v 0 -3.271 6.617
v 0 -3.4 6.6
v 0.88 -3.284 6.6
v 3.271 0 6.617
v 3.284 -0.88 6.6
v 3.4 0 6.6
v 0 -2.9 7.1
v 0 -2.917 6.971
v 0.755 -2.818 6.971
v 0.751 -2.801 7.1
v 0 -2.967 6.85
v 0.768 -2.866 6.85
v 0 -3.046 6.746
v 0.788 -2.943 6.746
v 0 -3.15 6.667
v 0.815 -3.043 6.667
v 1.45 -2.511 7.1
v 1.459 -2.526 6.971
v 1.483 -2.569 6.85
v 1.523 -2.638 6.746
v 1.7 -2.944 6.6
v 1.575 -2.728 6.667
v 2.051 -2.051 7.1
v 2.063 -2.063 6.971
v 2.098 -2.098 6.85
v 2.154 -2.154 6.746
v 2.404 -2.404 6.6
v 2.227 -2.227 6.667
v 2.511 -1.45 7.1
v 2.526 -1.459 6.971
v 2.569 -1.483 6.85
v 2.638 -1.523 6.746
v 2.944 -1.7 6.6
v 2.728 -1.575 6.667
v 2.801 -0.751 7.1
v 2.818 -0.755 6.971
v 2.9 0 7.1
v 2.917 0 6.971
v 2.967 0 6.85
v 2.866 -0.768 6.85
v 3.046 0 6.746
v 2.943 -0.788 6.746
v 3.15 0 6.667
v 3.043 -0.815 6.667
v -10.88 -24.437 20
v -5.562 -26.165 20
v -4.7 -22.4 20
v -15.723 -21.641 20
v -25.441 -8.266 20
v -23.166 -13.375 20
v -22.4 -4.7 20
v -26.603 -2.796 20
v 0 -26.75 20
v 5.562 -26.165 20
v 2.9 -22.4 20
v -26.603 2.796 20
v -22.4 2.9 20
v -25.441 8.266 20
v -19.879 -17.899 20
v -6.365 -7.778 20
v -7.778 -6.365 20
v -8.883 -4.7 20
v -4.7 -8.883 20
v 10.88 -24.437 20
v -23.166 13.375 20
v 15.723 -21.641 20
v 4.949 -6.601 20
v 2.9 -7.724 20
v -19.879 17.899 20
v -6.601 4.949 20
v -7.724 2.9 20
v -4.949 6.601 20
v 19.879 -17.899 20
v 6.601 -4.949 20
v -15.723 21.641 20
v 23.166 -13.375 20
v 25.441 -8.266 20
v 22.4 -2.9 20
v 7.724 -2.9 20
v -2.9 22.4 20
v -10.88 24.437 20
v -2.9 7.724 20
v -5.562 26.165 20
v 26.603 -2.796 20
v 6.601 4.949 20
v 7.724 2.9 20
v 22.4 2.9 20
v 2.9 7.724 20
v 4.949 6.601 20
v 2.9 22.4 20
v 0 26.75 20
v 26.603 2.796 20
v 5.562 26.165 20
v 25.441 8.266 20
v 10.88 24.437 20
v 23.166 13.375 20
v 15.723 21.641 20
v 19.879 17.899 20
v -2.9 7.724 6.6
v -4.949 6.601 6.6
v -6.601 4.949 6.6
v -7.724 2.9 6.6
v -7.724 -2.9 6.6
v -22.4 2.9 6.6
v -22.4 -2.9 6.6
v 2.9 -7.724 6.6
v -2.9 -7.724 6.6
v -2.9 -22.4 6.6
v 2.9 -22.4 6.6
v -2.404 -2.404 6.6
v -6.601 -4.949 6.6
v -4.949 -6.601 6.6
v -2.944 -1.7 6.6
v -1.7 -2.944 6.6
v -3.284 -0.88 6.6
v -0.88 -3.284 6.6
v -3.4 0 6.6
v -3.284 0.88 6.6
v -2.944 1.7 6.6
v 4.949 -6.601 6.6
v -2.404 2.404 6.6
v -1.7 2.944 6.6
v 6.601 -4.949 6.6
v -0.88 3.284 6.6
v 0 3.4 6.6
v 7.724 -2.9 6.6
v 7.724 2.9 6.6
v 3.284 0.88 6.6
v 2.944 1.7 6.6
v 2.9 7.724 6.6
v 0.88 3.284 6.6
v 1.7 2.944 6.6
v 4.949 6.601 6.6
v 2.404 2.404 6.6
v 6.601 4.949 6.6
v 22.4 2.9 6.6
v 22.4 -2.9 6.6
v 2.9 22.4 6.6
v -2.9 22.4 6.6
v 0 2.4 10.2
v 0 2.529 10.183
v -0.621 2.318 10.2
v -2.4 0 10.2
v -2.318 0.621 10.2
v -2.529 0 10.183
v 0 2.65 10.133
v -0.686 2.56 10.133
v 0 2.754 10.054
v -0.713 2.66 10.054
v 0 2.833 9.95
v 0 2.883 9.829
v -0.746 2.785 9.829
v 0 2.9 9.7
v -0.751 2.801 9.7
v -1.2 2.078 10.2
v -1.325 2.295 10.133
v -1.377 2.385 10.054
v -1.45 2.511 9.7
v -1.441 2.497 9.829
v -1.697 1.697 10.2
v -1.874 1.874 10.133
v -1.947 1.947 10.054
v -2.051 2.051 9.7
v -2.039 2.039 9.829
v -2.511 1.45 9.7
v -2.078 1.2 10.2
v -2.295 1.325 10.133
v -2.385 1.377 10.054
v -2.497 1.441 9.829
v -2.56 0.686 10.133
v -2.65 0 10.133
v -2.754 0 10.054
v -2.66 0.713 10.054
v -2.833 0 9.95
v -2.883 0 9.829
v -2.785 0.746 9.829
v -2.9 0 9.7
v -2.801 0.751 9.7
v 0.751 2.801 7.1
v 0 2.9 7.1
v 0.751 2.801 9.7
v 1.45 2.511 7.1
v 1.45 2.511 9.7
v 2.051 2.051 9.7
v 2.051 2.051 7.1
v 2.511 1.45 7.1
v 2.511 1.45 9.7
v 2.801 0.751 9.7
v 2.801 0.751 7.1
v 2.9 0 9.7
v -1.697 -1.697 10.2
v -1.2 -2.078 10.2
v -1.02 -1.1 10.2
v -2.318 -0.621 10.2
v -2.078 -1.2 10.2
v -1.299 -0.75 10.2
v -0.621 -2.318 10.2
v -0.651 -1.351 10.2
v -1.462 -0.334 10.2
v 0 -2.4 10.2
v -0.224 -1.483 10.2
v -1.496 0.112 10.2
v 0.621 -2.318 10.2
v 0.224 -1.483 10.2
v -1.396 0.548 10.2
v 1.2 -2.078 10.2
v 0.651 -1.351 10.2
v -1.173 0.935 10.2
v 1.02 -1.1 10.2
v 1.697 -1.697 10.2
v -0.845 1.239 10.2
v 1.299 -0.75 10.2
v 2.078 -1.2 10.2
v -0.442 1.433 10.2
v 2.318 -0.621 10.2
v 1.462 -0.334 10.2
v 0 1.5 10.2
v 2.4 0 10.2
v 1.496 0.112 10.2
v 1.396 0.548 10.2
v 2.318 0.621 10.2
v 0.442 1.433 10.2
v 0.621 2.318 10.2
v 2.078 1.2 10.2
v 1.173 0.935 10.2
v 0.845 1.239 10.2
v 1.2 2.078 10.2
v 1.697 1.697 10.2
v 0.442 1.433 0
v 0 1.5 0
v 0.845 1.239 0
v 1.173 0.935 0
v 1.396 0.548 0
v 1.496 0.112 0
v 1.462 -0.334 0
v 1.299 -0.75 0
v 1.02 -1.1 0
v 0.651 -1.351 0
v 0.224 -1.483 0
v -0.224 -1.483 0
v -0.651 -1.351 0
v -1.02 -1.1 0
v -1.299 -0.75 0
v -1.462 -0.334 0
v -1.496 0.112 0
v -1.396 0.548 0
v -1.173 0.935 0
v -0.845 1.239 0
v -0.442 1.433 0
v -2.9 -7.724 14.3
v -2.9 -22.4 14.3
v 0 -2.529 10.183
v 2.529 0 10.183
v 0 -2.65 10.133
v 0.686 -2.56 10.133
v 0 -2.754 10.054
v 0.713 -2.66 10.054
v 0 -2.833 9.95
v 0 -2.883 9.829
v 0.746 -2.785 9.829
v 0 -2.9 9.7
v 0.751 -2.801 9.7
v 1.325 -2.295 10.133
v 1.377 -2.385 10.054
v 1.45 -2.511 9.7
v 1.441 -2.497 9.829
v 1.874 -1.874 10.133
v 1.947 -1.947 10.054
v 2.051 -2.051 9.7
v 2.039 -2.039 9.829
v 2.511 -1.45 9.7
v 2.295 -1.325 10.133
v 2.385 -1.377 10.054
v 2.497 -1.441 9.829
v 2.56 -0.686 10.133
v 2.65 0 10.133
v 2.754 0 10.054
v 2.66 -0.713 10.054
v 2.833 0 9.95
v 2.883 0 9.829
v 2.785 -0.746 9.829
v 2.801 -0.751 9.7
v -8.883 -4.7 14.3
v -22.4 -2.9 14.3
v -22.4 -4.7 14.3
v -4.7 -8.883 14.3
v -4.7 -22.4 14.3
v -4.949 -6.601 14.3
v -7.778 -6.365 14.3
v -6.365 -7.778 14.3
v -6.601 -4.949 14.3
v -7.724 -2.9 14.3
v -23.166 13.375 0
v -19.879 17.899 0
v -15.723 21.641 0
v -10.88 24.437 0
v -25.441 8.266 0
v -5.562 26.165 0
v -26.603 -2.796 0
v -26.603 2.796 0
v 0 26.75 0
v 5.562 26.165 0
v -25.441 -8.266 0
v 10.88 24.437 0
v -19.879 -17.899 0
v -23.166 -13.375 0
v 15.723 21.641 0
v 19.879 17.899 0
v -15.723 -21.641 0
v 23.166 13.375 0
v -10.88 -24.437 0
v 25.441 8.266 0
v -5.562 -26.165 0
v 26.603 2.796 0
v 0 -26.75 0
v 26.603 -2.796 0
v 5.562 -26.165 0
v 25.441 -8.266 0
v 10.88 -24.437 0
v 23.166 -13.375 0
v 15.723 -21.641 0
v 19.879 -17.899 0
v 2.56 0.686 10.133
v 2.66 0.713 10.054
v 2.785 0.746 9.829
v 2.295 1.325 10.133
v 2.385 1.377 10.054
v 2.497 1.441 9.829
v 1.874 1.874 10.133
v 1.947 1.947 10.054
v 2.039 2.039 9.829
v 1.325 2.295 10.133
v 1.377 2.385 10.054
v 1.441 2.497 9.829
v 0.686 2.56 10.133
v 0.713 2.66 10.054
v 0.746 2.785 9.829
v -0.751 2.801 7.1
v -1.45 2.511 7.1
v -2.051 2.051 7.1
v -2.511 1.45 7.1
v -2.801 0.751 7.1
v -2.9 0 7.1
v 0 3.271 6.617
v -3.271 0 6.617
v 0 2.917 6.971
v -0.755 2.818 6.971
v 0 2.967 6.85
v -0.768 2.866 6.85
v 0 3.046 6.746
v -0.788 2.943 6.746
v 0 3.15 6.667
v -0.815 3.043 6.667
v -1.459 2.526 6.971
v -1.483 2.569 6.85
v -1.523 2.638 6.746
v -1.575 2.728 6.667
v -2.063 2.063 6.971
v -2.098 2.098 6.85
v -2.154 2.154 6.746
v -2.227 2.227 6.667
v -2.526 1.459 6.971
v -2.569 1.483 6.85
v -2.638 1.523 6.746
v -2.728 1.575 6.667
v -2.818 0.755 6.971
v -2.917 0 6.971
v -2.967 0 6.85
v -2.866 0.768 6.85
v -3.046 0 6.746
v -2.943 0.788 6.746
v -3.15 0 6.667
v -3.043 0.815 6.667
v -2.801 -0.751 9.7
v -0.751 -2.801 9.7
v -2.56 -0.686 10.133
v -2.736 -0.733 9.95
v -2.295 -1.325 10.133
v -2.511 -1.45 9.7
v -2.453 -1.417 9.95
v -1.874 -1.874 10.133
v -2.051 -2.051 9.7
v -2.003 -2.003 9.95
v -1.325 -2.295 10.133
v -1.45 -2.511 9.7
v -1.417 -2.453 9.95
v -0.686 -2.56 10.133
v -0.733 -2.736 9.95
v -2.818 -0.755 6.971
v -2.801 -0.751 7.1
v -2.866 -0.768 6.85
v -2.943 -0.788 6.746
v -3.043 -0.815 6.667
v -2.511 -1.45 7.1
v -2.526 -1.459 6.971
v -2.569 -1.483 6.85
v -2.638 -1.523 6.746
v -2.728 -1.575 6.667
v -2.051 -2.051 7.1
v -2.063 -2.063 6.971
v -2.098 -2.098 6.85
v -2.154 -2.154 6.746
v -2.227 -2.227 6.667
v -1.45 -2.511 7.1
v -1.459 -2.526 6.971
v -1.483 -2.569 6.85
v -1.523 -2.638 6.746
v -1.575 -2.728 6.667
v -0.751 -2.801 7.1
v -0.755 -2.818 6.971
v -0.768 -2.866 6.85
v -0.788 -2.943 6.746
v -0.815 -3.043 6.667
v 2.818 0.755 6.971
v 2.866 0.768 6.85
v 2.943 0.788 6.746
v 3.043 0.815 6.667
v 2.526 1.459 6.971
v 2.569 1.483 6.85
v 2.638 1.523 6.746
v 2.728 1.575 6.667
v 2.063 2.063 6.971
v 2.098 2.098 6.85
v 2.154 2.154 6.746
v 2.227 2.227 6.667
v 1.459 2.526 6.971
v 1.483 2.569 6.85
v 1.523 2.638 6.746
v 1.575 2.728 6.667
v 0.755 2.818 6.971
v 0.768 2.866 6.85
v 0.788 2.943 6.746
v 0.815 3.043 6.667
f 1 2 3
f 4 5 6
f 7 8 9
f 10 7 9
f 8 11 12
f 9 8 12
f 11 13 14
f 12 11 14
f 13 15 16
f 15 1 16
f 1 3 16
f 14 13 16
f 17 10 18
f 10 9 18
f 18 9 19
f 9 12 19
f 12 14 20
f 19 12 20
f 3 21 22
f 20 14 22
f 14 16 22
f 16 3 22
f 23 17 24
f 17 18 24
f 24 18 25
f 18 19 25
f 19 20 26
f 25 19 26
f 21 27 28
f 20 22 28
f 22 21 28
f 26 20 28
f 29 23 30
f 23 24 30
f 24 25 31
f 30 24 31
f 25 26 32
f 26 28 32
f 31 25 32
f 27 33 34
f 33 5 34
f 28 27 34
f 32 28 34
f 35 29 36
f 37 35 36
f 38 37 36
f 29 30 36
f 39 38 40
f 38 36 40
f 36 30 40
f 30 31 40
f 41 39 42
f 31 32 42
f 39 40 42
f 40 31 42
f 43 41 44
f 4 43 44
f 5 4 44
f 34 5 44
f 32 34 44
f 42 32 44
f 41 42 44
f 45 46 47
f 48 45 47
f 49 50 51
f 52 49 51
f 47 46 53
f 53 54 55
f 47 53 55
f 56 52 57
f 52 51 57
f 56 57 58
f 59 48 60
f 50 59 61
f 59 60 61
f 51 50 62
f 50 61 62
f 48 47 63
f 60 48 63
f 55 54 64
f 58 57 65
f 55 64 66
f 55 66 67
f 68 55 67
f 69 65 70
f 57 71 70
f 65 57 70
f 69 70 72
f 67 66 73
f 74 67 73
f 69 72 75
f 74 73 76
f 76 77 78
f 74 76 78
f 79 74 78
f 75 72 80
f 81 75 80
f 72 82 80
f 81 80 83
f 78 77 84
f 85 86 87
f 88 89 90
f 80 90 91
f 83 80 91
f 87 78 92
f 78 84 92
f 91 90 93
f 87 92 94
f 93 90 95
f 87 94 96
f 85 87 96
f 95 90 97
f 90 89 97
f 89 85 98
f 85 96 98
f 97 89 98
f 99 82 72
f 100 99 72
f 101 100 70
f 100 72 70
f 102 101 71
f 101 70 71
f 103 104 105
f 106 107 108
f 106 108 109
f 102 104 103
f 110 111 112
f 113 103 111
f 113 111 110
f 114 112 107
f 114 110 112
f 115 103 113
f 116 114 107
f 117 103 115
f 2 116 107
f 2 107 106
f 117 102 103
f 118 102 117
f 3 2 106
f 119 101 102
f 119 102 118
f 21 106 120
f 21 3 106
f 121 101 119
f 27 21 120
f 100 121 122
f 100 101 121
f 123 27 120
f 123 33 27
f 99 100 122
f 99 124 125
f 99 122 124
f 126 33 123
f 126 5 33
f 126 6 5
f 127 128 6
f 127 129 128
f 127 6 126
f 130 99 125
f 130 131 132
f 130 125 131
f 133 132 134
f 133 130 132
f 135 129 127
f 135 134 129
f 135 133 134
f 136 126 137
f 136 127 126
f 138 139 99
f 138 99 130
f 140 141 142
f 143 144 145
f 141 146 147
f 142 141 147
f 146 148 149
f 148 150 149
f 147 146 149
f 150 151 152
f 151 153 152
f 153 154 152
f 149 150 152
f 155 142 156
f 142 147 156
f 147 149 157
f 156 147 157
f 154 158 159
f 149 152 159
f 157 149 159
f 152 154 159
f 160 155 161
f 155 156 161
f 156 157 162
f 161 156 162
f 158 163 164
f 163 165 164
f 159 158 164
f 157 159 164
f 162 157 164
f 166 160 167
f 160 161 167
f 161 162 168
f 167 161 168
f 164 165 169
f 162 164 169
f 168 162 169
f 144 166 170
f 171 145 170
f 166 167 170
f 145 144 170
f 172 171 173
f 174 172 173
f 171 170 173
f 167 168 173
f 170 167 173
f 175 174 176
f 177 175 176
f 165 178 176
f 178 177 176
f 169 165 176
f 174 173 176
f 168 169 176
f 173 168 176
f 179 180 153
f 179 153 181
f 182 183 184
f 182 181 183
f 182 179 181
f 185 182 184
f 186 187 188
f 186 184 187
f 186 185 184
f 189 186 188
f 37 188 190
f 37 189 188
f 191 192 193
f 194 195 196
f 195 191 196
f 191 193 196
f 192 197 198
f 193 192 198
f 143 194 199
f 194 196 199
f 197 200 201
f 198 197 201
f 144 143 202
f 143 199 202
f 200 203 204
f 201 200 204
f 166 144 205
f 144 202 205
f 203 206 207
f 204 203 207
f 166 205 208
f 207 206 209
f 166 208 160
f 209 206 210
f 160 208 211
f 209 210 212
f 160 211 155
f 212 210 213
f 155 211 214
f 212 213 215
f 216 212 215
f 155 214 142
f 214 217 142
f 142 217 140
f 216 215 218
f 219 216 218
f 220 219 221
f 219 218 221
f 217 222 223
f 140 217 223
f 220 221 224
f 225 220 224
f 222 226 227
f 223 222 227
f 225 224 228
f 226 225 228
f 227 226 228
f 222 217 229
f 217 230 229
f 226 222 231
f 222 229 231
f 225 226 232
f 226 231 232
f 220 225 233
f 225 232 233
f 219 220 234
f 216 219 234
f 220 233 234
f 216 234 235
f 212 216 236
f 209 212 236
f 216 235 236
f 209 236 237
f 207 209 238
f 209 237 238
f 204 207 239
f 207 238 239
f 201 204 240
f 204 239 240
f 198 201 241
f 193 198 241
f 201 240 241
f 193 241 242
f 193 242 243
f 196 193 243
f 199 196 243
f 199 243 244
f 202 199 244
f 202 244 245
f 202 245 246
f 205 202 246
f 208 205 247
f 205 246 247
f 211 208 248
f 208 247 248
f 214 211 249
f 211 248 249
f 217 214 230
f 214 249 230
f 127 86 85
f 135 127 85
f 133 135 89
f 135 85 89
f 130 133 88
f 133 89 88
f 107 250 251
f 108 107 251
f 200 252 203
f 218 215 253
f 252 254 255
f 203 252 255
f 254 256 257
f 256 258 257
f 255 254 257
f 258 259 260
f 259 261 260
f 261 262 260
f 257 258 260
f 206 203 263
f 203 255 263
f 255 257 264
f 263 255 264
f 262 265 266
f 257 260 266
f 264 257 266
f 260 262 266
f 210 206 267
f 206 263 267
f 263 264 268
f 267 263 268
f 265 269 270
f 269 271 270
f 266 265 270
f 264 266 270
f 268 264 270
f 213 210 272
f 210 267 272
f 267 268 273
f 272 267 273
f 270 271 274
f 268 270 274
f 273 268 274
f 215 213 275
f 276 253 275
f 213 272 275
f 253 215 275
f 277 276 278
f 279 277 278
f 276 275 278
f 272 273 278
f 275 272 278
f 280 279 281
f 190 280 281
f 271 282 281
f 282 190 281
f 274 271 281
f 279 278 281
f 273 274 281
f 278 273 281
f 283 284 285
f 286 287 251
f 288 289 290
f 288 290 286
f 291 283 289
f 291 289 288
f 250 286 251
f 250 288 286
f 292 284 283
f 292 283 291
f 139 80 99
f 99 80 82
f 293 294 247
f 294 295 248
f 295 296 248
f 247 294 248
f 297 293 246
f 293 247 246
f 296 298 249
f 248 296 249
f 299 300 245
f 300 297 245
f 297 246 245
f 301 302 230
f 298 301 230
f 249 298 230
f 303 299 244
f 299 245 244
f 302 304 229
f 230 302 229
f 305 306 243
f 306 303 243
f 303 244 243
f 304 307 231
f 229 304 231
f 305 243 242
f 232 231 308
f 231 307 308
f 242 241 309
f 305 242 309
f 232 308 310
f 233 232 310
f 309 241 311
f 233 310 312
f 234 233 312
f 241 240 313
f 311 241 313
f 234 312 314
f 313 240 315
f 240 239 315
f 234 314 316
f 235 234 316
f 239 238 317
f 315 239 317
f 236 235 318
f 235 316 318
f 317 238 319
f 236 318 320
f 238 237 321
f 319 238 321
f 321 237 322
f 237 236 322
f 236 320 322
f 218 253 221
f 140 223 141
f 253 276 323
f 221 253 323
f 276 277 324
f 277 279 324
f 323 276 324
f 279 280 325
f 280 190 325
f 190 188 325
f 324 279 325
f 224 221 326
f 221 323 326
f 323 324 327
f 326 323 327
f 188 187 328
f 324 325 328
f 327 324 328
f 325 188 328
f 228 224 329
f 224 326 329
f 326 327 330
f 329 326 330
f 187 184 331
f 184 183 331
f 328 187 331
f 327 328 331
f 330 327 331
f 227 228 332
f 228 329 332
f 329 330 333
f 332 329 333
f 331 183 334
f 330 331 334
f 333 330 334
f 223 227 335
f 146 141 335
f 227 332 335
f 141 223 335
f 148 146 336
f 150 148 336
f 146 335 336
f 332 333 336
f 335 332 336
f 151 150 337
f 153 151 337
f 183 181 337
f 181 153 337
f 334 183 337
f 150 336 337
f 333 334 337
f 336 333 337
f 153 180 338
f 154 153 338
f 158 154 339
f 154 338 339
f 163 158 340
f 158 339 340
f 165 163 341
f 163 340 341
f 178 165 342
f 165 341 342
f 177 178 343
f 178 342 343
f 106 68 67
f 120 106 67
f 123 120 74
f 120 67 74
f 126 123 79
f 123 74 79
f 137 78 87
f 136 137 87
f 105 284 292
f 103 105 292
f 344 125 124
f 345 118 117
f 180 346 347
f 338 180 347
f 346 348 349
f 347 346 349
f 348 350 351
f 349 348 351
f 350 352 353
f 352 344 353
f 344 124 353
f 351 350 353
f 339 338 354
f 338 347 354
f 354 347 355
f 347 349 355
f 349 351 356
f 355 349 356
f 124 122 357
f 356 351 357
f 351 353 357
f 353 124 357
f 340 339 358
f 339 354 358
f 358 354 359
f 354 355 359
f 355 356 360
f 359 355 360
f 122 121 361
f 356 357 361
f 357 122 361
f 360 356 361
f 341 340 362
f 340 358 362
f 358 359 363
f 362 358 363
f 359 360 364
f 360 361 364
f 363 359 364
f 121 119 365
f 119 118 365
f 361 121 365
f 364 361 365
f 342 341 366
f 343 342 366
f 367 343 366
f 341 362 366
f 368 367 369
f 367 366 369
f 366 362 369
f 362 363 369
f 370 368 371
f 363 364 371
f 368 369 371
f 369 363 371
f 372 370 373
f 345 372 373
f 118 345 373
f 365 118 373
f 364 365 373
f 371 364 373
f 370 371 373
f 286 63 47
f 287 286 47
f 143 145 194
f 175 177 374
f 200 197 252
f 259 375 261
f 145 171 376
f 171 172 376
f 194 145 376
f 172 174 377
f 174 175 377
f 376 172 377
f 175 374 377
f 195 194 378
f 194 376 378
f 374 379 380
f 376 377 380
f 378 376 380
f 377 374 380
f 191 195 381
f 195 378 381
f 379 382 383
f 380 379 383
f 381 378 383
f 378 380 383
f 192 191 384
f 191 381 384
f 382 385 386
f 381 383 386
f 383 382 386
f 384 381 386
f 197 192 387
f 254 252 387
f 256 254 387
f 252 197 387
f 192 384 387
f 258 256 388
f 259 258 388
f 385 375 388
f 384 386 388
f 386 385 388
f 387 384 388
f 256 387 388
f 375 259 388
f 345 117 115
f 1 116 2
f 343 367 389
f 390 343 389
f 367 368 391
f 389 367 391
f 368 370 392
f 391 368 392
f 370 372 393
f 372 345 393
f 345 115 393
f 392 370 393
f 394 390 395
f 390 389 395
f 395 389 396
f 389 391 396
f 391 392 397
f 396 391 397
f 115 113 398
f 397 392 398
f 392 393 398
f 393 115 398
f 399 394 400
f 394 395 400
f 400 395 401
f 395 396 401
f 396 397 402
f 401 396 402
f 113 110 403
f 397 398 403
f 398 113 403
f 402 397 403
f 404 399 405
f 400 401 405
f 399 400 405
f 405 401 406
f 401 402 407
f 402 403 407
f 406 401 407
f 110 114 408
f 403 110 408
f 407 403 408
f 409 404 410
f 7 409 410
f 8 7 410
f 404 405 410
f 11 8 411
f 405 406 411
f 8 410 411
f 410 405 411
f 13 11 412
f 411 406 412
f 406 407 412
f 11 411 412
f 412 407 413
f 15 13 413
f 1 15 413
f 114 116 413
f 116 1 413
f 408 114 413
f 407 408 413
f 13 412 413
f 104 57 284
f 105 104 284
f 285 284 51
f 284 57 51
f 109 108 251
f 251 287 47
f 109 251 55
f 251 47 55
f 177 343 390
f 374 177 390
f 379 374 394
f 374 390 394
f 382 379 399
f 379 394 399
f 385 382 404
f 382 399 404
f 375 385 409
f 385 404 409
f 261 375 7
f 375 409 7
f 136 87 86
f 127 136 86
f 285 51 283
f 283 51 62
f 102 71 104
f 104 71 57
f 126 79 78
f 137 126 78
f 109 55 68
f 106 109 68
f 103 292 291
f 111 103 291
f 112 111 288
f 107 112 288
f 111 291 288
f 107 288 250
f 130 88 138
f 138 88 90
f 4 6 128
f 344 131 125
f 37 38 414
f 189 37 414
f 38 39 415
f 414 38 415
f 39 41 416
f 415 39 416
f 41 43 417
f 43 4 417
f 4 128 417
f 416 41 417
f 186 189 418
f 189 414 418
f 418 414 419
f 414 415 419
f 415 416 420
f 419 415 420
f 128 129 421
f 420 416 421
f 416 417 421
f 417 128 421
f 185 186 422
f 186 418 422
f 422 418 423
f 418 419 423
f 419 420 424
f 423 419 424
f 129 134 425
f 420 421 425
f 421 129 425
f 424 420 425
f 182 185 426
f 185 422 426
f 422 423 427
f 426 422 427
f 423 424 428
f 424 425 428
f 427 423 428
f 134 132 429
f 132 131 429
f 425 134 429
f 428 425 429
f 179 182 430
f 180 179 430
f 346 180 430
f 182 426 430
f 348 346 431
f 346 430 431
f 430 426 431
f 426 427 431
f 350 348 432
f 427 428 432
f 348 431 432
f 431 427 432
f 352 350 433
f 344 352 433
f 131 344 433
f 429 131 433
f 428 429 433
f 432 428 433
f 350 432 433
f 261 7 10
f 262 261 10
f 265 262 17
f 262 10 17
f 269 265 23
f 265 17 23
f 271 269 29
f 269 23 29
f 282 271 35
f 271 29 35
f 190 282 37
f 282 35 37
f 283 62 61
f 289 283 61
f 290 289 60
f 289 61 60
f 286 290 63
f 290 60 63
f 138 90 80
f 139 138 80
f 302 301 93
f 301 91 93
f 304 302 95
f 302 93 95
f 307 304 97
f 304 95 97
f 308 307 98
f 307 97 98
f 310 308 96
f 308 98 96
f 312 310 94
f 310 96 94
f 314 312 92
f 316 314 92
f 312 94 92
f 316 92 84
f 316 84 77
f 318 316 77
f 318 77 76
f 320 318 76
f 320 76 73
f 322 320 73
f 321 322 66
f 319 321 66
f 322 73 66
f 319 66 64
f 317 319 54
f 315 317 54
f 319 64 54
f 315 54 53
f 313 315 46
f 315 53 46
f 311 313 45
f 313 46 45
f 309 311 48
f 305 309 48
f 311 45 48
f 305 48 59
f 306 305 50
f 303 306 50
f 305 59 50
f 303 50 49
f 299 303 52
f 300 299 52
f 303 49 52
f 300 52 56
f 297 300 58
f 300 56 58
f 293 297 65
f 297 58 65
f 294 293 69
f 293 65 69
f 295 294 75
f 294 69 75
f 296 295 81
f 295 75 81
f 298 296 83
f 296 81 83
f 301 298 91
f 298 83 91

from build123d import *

# Parameters (mm, degrees)
F3_DEPTH = 13.4
F5_R     = 2.89999
F6_R     = 0.5
F7_DEPTH = 5.7


# Not quite as in the source:
# - a fillet or chamfer is up to 0.001 mm smaller than in the source, because OpenCascade refuses the exact size


with BuildPart() as f1:
    # F0 (on Right) → F1 (revolve)
    with BuildSketch(Plane.YZ):
        Polygon((1.5, 10.2), (1.5, 0), (26.75, 0), (26.75, 20), (4.125, 20), (4.125, 10.2), align=None)
    revolve(axis=Axis((0, 0, 0.3519081866), (0, 0, -1)))

    # F2 (on face) → F3 (cut)
    with BuildSketch(Plane.XY.offset(20)):
        with BuildLine():
            Line((-22.4, 2.9), (-22.4, -2.9))
            Line((-22.4, -2.9), (-7.7235030912, -2.9))
            ThreePointArc((-7.7235030912, -2.9), (-8.25, 0), (-7.7235030912, 2.9))
            Line((-7.7235030912, 2.9), (-22.4, 2.9))
        make_face()
        with BuildLine():
            ThreePointArc((-7.7235030912, 2.9), (-8.25, 0), (-7.7235030912, -2.9))
            Line((-7.7235030912, -2.9), (-2.9, -2.9))
            Line((-2.9, -2.9), (-2.9, 2.9))
            Line((-2.9, 2.9), (-7.7235030912, 2.9))
        make_face()
        with BuildLine():
            Line((-2.9, -2.9), (-7.7235030912, -2.9))
            ThreePointArc((-7.7235030912, -2.9), (-5.8336309448, -5.8336309448), (-2.9, -7.7235030912))
            Line((-2.9, -7.7235030912), (-2.9, -2.9))
        make_face()
        with BuildLine():
            Line((2.9, -2.9), (-2.9, -2.9))
            Line((-2.9, -2.9), (-2.9, -7.7235030912))
            ThreePointArc((-2.9, -7.7235030912), (0, -8.25), (2.9, -7.7235030912))
            Line((2.9, -7.7235030912), (2.9, -2.9))
        make_face()
        with BuildLine():
            ThreePointArc((-2.9, 7.7235030912), (-5.8336309448, 5.8336309448), (-7.7235030912, 2.9))
            Line((-7.7235030912, 2.9), (-2.9, 2.9))
            Line((-2.9, 2.9), (-2.9, 7.7235030912))
        make_face()
        with BuildLine():
            ThreePointArc((2.9, -7.7235030912), (0, -8.25), (-2.9, -7.7235030912))
            Line((-2.9, -7.7235030912), (-2.9, -22.4))
            Line((-2.9, -22.4), (2.9, -22.4))
            Line((2.9, -22.4), (2.9, -7.7235030912))
        make_face()
        with BuildLine():
            Line((2.9, 2.9), (2.9, -2.9))
            Line((2.9, -2.9), (7.7235030912, -2.9))
            ThreePointArc((7.7235030912, -2.9), (8.1173086828, -1.4737027342), (8.25, 0))
            ThreePointArc((8.25, 0), (8.1173086828, 1.4737027342), (7.7235030912, 2.9))
            Line((7.7235030912, 2.9), (2.9, 2.9))
        make_face()
        with BuildLine():
            Line((7.7235030912, -2.9), (2.9, -2.9))
            Line((2.9, -2.9), (2.9, -7.7235030912))
            ThreePointArc((2.9, -7.7235030912), (5.8336309448, -5.8336309448), (7.7235030912, -2.9))
        make_face()
        with BuildLine():
            Line((-2.9, 7.7235030912), (-2.9, 2.9))
            Line((-2.9, 2.9), (2.9, 2.9))
            Line((2.9, 2.9), (2.9, 7.7235030912))
            ThreePointArc((2.9, 7.7235030912), (0, 8.25), (-2.9, 7.7235030912))
        make_face()
        with BuildLine():
            Line((-2.9, 22.4), (-2.9, 7.7235030912))
            ThreePointArc((-2.9, 7.7235030912), (0, 8.25), (2.9, 7.7235030912))
            Line((2.9, 7.7235030912), (2.9, 22.4))
            Line((2.9, 22.4), (-2.9, 22.4))
        make_face()
        with BuildLine():
            ThreePointArc((8.25, 0), (8.1173086828, -1.4737027342), (7.7235030912, -2.9))
            Line((7.7235030912, -2.9), (22.4, -2.9))
            Line((22.4, -2.9), (22.4, 2.9))
            Line((22.4, 2.9), (7.7235030912, 2.9))
            ThreePointArc((7.7235030912, 2.9), (8.1173086828, 1.4737027342), (8.25, 0))
        make_face()
        with BuildLine():
            Line((2.9, 7.7235030912), (2.9, 2.9))
            Line((2.9, 2.9), (7.7235030912, 2.9))
            ThreePointArc((7.7235030912, 2.9), (5.8336309448, 5.8336309448), (2.9, 7.7235030912))
        make_face()
    extrude(amount=-F3_DEPTH, mode=Mode.SUBTRACT)

    # F5 (radius 2.9 in the source; OpenCascade refuses exactly that, so slightly less here)
    f5_edges = [f1.edges().sort_by_distance(p)[0] for p in [
        (2.9, 2.9, 8.4),
        (-2.9, -2.9, 8.4),
        (-2.9, 2.9, 8.4),
        (2.9, -2.9, 8.4),
    ]]
    fillet(f5_edges, radius=F5_R)

    # F6
    f6_edges = [f1.edges().sort_by_distance(p)[0] for p in [
        (-2.050613, -2.050613, 6.6),
        (-2.050613, -2.050613, 10.2),
    ]]
    fillet(f6_edges, radius=F6_R)

    # F4 (on face) → F7 (cut)
    with BuildSketch(Plane.XY.offset(20)):
        with BuildLine():
            Line((-4.7, -8.883270794), (-4.7, -22.4))
            Line((-4.7, -22.4), (-2.9, -22.4))
            Line((-2.9, -22.4), (-2.9, -7.7235030912))
            ThreePointArc((-2.9, -7.7235030912), (-5.8336309448, -5.8336309448), (-7.7235030912, -2.9))
            Line((-7.7235030912, -2.9), (-22.4, -2.9))
            Line((-22.4, -2.9), (-22.4, -4.7))
            Line((-22.4, -4.7), (-8.883270794, -4.7))
            ThreePointArc((-8.883270794, -4.7), (-7.1064231509, -7.1064231509), (-4.7, -8.883270794))
        make_face()
    extrude(amount=-F7_DEPTH, mode=Mode.SUBTRACT)


solid = f1.part
